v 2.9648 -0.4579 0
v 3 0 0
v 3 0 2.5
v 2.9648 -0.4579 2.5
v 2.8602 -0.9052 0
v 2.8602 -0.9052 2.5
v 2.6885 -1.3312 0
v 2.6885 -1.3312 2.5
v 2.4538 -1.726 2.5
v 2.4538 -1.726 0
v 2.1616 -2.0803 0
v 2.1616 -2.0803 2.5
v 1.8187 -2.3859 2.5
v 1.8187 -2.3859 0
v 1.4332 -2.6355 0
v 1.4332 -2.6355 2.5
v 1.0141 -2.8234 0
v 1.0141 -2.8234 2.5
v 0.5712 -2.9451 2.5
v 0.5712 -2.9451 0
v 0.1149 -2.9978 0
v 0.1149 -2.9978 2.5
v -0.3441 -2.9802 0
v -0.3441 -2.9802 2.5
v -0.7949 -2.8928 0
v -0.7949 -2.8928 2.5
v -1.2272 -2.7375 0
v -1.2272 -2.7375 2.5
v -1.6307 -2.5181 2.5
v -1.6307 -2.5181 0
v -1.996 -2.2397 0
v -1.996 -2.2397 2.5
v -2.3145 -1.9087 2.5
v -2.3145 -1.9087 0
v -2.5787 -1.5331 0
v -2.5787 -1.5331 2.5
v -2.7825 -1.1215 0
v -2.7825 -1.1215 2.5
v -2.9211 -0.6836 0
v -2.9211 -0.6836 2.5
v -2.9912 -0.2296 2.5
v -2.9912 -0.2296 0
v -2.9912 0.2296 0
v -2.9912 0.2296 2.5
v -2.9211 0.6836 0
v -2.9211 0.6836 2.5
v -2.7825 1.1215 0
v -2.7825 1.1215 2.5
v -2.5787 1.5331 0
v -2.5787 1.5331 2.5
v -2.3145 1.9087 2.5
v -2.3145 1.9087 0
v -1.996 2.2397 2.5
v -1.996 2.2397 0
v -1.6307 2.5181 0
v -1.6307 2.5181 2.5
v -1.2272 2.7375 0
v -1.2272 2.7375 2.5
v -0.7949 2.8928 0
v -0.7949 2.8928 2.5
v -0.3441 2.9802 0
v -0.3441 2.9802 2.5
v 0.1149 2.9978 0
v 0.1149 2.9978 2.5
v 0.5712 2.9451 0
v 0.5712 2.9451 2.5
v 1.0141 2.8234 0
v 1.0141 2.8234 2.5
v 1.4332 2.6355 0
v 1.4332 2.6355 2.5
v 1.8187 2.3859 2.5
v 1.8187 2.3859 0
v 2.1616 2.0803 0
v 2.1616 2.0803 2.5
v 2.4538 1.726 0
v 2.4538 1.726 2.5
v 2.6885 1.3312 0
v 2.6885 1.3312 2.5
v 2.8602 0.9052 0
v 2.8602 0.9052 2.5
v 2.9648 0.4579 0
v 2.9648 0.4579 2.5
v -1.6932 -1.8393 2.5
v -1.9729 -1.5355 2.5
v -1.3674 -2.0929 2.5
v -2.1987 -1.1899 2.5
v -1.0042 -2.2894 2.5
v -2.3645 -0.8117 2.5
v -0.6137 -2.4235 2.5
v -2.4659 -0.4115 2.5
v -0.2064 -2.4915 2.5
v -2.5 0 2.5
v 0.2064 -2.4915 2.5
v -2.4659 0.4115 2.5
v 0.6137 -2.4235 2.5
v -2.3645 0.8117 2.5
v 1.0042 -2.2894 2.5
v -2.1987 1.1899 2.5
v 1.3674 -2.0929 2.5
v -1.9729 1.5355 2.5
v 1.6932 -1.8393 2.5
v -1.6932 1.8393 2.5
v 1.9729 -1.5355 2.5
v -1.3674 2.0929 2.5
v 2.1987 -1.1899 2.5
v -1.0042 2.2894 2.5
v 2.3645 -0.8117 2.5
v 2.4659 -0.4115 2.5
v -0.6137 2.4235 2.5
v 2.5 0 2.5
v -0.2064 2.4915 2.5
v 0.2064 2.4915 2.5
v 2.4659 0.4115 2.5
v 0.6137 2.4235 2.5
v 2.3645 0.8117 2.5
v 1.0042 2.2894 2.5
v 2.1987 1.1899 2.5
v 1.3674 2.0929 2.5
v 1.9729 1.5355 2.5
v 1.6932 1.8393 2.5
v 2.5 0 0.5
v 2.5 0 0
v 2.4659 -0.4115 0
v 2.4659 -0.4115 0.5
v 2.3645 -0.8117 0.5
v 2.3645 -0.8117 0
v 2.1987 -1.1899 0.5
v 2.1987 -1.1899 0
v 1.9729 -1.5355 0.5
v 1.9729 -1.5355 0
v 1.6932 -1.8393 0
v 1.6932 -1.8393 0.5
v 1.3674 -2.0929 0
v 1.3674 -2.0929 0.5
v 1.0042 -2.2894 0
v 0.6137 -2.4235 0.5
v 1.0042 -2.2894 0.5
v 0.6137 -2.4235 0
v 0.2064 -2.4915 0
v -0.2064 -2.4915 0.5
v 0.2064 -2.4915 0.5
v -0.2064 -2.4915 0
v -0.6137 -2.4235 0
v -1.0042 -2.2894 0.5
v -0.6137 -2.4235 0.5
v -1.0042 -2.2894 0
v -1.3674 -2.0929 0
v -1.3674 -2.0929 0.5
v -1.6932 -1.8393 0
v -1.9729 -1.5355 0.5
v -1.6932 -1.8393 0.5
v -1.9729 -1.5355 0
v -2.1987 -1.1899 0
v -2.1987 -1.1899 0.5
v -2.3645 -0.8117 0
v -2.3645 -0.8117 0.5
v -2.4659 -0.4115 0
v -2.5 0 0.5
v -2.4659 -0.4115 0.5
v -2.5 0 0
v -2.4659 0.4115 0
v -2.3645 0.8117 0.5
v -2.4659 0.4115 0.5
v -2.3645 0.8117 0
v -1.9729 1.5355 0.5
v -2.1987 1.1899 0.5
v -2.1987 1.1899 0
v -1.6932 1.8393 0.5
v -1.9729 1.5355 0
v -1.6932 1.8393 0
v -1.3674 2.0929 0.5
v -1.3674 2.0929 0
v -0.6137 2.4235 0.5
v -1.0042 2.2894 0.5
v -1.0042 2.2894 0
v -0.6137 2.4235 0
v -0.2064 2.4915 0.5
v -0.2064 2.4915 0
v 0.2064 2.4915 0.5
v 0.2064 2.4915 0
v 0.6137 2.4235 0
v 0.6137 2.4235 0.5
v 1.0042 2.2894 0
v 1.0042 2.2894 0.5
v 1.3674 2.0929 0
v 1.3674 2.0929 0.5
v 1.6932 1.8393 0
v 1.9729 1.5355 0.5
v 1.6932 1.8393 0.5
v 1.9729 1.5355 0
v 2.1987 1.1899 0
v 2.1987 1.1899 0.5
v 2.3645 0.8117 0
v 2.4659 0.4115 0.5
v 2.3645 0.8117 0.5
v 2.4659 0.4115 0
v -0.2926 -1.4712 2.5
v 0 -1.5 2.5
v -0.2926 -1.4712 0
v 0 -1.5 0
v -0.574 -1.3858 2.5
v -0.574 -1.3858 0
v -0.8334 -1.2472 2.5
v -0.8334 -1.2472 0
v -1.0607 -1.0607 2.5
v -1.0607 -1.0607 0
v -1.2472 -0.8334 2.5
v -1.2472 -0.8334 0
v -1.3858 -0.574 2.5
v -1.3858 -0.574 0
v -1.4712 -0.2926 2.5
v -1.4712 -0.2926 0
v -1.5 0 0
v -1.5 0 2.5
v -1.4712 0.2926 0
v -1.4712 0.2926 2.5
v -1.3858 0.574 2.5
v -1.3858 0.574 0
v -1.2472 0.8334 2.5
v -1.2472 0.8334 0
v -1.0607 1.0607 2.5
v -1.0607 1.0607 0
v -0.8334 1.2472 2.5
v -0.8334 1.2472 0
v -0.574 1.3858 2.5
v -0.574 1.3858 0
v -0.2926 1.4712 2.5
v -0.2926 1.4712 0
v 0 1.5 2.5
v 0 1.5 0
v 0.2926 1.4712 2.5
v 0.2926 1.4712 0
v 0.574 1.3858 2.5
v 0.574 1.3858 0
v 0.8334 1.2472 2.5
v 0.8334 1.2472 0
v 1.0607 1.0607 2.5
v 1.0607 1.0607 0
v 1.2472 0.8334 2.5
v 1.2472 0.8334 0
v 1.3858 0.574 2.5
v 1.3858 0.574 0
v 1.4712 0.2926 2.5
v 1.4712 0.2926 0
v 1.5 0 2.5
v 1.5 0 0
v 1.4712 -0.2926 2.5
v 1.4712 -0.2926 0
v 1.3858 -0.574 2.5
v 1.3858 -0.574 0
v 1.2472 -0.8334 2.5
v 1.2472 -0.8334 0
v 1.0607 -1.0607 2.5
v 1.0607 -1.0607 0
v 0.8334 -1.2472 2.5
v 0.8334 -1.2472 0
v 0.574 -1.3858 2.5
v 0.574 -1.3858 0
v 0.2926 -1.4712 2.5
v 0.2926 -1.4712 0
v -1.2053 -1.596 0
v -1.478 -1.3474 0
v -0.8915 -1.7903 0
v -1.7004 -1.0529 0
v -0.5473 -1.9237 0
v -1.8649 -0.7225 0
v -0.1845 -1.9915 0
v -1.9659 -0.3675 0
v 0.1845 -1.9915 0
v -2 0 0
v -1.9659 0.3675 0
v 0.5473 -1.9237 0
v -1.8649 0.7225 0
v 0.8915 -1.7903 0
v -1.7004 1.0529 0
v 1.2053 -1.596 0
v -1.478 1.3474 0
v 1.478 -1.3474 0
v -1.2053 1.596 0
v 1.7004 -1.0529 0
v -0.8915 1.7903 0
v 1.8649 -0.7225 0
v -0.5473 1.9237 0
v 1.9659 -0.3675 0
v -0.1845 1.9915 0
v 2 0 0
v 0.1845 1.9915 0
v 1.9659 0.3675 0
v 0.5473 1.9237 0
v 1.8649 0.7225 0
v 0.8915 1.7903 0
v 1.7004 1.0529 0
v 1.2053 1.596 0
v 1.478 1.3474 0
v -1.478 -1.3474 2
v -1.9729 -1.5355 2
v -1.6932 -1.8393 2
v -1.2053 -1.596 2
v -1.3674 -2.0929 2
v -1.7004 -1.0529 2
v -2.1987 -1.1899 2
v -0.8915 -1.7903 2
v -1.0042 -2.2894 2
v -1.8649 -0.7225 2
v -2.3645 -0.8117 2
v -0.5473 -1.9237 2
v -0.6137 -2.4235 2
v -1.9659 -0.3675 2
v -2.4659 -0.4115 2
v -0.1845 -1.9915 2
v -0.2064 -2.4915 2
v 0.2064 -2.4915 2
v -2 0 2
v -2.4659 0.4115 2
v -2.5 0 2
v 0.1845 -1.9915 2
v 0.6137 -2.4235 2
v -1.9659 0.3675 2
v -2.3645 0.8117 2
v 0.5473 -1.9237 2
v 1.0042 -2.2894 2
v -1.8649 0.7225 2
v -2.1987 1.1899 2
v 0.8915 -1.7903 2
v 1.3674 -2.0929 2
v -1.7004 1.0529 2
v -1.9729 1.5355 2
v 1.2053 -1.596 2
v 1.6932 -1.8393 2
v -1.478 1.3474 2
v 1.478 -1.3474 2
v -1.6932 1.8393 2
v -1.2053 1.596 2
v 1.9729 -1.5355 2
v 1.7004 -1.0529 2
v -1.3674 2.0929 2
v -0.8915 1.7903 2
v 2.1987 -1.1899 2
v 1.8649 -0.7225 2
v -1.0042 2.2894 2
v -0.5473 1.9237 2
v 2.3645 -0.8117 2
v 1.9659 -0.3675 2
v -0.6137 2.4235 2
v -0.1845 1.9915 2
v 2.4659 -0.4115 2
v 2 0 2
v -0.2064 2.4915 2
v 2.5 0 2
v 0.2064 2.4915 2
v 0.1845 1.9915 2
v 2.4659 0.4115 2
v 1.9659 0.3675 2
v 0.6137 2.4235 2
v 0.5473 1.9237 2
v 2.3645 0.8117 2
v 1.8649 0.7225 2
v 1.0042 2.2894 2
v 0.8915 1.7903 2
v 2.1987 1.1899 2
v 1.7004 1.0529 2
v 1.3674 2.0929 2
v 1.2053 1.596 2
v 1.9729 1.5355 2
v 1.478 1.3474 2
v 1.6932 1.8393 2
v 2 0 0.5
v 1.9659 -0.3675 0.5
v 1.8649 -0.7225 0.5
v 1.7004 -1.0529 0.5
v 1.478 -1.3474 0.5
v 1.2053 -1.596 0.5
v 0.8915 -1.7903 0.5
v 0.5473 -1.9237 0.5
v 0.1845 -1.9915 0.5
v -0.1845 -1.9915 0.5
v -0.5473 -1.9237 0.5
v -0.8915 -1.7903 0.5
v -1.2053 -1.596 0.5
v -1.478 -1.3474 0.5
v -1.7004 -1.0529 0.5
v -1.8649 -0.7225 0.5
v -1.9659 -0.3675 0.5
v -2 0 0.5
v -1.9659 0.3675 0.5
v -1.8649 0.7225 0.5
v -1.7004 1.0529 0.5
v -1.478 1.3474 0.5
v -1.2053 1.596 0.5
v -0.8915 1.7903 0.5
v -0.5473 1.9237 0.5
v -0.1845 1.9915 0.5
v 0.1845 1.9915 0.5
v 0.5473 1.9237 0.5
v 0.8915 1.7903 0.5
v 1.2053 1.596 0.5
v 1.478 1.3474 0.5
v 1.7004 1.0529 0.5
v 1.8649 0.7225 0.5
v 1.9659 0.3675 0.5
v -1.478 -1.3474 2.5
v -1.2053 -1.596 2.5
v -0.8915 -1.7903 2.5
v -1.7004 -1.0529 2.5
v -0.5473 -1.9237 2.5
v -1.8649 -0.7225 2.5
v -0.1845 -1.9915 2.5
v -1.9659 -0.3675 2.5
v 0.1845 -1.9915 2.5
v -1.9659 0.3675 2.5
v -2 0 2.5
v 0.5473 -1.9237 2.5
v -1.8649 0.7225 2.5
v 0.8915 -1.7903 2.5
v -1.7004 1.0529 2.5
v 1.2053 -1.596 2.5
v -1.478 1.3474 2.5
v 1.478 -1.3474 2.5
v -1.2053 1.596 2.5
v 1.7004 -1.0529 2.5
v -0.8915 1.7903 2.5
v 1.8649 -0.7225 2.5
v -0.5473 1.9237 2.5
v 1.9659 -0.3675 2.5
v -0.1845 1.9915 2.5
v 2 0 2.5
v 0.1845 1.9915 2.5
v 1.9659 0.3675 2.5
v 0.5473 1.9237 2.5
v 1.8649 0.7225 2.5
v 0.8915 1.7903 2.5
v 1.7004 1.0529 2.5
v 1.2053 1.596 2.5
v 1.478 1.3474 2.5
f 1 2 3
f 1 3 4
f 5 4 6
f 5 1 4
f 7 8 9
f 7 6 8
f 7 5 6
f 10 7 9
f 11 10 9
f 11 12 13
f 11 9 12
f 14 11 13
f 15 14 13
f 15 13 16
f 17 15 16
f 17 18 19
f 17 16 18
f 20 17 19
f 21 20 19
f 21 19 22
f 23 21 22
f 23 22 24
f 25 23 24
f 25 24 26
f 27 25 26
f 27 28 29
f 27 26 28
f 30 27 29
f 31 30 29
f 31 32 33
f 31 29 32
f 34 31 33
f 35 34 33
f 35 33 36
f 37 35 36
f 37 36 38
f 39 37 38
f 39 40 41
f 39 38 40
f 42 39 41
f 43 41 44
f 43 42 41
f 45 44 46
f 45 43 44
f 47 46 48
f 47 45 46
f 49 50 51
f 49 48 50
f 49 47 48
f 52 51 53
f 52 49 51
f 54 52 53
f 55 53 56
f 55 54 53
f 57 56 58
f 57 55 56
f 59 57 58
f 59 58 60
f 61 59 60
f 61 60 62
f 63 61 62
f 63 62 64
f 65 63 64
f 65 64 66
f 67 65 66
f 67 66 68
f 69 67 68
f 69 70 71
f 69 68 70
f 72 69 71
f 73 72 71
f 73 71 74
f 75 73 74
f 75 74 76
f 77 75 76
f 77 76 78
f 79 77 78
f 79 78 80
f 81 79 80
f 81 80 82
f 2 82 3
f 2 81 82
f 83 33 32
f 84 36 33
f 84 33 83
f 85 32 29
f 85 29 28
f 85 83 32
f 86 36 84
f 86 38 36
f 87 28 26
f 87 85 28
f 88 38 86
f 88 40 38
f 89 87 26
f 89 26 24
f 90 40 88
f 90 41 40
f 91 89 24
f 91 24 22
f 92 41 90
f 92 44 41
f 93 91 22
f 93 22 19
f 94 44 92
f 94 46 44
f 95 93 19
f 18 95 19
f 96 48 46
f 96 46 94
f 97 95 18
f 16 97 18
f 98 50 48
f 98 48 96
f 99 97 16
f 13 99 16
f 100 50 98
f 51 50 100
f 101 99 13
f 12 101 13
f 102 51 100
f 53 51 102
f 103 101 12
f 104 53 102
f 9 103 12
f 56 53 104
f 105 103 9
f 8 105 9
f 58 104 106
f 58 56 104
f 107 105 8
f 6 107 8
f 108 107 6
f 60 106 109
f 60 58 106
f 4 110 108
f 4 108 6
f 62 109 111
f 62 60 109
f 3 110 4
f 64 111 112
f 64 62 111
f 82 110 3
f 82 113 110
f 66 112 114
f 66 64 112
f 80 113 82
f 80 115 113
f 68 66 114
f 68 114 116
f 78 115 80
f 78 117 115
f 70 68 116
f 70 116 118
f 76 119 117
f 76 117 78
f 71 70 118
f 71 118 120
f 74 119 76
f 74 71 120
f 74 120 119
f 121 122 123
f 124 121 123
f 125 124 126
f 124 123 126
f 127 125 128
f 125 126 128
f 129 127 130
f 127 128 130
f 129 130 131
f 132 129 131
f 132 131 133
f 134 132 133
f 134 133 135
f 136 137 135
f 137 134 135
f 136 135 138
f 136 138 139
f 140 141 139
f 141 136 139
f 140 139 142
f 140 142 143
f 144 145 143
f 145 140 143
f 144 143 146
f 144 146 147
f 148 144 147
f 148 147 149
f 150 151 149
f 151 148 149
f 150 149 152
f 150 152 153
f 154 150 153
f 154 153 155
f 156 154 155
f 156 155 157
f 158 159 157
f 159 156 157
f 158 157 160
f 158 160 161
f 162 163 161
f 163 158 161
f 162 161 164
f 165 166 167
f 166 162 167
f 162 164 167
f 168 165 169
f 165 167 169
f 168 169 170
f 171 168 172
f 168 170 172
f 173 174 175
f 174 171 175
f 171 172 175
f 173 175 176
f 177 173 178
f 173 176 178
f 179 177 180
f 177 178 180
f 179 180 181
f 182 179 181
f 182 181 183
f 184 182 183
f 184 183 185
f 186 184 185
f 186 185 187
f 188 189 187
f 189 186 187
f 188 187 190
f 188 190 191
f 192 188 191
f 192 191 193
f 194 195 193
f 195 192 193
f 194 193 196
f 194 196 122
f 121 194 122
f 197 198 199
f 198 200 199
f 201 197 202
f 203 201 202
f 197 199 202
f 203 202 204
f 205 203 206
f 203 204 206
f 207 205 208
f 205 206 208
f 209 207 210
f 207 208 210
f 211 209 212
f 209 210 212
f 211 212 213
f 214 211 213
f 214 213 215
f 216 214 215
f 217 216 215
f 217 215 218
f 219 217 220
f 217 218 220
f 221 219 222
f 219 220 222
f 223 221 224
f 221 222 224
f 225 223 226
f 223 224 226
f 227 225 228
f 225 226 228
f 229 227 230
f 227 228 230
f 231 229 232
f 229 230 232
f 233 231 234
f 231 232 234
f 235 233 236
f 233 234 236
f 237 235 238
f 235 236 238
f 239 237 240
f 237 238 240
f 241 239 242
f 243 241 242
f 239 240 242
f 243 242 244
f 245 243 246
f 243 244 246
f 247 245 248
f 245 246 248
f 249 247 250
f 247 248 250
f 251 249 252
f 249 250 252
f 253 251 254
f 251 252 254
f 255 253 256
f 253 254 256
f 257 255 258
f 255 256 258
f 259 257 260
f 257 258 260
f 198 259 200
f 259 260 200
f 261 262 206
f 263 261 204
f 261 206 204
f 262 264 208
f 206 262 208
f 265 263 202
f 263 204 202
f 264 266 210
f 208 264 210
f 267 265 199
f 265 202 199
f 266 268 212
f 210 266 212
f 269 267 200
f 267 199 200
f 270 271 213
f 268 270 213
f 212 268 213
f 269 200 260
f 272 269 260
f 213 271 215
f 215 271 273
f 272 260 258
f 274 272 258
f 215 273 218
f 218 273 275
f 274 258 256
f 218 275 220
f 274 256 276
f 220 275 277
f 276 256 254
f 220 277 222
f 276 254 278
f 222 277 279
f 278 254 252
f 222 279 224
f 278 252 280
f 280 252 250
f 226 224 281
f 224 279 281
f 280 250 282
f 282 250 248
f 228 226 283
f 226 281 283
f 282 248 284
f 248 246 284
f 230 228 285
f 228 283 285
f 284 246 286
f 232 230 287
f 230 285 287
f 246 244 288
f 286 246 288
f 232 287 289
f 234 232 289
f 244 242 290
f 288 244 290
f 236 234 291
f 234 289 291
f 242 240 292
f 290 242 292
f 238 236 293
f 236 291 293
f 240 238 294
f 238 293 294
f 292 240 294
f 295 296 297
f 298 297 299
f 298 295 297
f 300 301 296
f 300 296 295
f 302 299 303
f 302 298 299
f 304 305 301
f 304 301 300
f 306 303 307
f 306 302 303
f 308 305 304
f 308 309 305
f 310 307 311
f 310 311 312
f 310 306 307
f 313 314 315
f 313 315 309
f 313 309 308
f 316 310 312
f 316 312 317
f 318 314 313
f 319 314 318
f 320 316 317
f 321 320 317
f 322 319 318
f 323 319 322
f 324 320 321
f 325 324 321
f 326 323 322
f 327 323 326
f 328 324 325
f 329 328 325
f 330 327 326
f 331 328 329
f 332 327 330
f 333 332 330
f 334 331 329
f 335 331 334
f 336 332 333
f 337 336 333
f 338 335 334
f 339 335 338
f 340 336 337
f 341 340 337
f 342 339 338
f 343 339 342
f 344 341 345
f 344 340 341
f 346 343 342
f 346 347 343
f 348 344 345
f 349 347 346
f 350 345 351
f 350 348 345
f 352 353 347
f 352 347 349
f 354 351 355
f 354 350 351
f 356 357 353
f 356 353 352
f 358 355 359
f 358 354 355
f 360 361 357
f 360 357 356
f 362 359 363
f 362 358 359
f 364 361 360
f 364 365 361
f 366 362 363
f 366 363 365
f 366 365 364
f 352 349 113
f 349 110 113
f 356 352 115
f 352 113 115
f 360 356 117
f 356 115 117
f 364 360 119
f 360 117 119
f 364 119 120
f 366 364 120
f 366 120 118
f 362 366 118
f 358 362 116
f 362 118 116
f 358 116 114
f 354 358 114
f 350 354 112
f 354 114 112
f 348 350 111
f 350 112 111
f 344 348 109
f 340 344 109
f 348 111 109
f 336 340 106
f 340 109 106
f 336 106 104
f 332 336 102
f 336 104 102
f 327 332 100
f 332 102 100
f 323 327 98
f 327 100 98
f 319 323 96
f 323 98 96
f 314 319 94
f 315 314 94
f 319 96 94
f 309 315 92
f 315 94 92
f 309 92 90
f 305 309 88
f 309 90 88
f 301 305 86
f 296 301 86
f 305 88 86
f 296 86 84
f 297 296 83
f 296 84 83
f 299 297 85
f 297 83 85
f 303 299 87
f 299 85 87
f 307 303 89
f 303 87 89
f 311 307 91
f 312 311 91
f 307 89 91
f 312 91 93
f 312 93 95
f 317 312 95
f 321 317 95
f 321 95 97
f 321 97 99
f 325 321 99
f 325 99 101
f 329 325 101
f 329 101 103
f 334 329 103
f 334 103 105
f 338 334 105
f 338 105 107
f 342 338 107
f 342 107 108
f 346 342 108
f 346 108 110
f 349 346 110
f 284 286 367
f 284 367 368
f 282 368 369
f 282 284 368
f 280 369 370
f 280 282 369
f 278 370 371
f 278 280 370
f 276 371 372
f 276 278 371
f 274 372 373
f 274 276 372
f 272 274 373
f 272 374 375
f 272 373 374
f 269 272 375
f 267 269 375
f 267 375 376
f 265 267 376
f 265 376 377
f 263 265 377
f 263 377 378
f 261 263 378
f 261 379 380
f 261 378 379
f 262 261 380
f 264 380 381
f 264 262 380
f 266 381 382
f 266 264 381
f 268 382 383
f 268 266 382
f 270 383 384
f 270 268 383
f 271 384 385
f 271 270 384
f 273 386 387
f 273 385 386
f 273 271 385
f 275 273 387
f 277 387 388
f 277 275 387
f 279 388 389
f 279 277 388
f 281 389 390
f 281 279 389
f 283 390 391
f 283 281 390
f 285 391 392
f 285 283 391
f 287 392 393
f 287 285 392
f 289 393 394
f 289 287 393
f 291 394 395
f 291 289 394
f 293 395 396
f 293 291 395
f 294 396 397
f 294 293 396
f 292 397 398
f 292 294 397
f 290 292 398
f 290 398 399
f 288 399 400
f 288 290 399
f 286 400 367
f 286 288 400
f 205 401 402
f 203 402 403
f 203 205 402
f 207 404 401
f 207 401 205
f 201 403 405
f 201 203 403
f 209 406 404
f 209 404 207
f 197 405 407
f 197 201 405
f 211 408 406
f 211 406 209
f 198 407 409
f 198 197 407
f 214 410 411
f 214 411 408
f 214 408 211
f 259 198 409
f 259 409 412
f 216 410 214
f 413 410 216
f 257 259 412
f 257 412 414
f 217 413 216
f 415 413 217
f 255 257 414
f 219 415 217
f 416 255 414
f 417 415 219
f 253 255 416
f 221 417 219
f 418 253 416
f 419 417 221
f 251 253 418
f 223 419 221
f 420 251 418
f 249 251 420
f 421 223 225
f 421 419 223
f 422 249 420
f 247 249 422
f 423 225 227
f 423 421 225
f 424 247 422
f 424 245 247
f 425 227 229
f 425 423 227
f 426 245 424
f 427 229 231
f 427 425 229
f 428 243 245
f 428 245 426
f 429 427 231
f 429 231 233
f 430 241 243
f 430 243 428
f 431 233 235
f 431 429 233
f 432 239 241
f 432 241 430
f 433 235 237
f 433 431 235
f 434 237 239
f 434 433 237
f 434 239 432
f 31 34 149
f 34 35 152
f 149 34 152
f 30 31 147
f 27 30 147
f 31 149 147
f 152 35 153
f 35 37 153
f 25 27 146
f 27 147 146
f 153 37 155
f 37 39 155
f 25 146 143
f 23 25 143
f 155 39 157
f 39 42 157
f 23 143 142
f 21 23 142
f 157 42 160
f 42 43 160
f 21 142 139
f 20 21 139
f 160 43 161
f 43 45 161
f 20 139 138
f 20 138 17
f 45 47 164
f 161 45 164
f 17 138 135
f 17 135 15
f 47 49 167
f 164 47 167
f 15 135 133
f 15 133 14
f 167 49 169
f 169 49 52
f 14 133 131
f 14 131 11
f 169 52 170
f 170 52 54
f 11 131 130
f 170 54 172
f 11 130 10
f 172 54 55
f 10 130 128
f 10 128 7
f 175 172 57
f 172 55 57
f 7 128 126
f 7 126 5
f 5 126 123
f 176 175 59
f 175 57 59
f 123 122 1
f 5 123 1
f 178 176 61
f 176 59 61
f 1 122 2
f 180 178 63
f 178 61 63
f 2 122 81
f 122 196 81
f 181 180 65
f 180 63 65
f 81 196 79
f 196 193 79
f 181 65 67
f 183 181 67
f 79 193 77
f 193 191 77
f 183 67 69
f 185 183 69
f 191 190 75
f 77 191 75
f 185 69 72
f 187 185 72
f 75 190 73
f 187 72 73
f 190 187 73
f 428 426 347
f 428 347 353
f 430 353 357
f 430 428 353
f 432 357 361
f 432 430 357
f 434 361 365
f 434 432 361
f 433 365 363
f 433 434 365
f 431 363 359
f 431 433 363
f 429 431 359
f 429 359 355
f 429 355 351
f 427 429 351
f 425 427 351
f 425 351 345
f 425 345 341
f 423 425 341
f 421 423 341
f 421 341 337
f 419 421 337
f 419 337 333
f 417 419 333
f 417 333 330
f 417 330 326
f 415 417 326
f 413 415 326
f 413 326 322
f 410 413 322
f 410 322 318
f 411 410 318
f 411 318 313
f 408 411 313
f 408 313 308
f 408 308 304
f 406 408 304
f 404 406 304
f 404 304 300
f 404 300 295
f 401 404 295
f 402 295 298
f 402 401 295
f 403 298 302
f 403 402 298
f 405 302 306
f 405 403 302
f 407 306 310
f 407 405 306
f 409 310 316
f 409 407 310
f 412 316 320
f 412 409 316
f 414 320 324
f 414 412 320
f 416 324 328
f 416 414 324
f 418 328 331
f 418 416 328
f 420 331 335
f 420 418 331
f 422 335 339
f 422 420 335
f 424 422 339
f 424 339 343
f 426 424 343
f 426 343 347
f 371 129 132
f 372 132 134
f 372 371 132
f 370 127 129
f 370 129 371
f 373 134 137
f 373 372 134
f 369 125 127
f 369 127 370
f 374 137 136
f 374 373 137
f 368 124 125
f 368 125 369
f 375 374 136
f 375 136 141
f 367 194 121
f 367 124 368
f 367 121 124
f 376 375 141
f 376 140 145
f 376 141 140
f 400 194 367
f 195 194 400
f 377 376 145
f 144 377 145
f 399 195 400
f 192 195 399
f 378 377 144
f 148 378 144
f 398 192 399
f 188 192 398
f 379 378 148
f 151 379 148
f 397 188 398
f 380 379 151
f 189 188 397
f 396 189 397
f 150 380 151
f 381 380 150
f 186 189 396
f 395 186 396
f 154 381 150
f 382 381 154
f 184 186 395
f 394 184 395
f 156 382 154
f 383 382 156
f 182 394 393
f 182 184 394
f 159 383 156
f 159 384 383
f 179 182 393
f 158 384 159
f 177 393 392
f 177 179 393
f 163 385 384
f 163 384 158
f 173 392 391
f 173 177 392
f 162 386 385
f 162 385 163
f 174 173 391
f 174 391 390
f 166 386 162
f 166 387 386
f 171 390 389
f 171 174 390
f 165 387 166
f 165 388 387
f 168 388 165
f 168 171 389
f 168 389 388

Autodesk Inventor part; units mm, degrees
ref_plane "YZ Plane" through (0, 0, 0) normal (1, 0, 0) x (0, 1, 0)
ref_plane "XZ Plane" through (0, 0, 0) normal (0, 1, 0) x (-1, 0, 0)
sketch "Sketch1" plane through (0, 0, 0) normal (0, 0, 1) x (1, 0, 0)
  circle A0 centre (0, 0) radius 3
  dimension "d0" = 6
extrude "Extrusion1" add sketch "Sketch1" along normal blind 2.5
hole "Hole1" at (0, 0, 2.5) direction (0, 0, -1) diameter 3 end through all
sketch "Sketch2" plane through (0, 0, 2.5) normal (0, 0, 1) x (1, 0, 0)
  circle A0 centre (0, 0) radius 2.5
  circle A1 centre (0, 0) radius 2
  dimension "d12" = 5
  dimension "d13" = 4
extrude "Extrusion2" cut sketch "Sketch2" against normal blind 0.5
ref_plane "Work Plane1" through (0, 0, 1.25) normal (0, 0, 1) x (1, 0, 0)
mirror "Mirror1" about plane through (0, 0, 1.25) normal (0, 0, 1) of "Extrusion2"
properties part number "bearing_3x6x2,5" material "Stainless Steel"
